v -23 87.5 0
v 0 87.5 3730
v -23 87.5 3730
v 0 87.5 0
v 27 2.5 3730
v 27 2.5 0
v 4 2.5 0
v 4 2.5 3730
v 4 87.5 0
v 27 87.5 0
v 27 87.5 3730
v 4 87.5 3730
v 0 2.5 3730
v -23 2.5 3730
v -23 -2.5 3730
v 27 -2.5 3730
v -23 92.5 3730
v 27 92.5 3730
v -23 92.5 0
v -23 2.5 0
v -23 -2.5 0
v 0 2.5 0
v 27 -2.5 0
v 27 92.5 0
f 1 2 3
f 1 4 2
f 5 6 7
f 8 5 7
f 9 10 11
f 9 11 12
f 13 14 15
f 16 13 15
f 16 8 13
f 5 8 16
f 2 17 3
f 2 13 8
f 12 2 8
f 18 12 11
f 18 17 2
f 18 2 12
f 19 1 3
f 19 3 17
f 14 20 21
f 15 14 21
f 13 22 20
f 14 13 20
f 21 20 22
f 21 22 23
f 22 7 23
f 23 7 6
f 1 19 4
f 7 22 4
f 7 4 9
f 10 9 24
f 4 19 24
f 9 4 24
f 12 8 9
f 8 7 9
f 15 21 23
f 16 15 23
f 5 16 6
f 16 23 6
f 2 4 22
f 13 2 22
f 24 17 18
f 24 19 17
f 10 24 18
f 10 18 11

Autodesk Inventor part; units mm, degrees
ref_plane "YZ Plane" through (0, 0, 0) normal (1, 0, 0) x (0, 1, 0)
ref_plane "XZ Plane" through (0, 0, 0) normal (0, 1, 0) x (-1, 0, 0)
ref_plane "XY Plane" through (0, 0, 0) normal (0, 0, 1) x (1, 0, 0)
sketch "Sketch1" plane through (0, 0, 0) normal (0, 0, 1) x (1, 0, 0)
  line L0 (0, 0) -> (4, 0)
  line L1 (4, 0) -> (4, 90)
  line L2 (4, 90) -> (0, 90)
  line L3 (0, 90) -> (0, 0)
  line L4 (-23, 92.5) -> (27, 92.5)
  line L5 (27, 92.5) -> (27, 87.5)
  line L6 (27, 87.5) -> (-23, 87.5)
  line L7 (-23, 87.5) -> (-23, 92.5)
  line L8 (-23, 92.5) -> (27, 87.5) construction
  line L9 (27, 92.5) -> (-23, 87.5) construction
  line L10 (-23, -2.5) -> (27, -2.5)
  line L11 (27, -2.5) -> (27, 2.5)
  line L12 (27, 2.5) -> (-23, 2.5)
  line L13 (-23, 2.5) -> (-23, -2.5)
  line L14 (-23, -2.5) -> (27, 2.5) construction
  line L15 (27, -2.5) -> (-23, 2.5) construction
  point P0 (2, 90)
  point P1 (2, 0)
  point P2 (4, 87.5)
  point P3 (0, 87.5)
  point P4 (0, 2.5)
  point P5 (4, 2.5)
  dimension "d0" = 4
  dimension "d1" = 90
  dimension "d2" = 50
  dimension "d3" = 5
  dimension "d4" = 50
  dimension "d5" = 5
extrude "Extrusion1" add sketch "Sketch1" along normal blind 3730
properties part number "Floor Frame, I Section" material "Aluminum 6061"
